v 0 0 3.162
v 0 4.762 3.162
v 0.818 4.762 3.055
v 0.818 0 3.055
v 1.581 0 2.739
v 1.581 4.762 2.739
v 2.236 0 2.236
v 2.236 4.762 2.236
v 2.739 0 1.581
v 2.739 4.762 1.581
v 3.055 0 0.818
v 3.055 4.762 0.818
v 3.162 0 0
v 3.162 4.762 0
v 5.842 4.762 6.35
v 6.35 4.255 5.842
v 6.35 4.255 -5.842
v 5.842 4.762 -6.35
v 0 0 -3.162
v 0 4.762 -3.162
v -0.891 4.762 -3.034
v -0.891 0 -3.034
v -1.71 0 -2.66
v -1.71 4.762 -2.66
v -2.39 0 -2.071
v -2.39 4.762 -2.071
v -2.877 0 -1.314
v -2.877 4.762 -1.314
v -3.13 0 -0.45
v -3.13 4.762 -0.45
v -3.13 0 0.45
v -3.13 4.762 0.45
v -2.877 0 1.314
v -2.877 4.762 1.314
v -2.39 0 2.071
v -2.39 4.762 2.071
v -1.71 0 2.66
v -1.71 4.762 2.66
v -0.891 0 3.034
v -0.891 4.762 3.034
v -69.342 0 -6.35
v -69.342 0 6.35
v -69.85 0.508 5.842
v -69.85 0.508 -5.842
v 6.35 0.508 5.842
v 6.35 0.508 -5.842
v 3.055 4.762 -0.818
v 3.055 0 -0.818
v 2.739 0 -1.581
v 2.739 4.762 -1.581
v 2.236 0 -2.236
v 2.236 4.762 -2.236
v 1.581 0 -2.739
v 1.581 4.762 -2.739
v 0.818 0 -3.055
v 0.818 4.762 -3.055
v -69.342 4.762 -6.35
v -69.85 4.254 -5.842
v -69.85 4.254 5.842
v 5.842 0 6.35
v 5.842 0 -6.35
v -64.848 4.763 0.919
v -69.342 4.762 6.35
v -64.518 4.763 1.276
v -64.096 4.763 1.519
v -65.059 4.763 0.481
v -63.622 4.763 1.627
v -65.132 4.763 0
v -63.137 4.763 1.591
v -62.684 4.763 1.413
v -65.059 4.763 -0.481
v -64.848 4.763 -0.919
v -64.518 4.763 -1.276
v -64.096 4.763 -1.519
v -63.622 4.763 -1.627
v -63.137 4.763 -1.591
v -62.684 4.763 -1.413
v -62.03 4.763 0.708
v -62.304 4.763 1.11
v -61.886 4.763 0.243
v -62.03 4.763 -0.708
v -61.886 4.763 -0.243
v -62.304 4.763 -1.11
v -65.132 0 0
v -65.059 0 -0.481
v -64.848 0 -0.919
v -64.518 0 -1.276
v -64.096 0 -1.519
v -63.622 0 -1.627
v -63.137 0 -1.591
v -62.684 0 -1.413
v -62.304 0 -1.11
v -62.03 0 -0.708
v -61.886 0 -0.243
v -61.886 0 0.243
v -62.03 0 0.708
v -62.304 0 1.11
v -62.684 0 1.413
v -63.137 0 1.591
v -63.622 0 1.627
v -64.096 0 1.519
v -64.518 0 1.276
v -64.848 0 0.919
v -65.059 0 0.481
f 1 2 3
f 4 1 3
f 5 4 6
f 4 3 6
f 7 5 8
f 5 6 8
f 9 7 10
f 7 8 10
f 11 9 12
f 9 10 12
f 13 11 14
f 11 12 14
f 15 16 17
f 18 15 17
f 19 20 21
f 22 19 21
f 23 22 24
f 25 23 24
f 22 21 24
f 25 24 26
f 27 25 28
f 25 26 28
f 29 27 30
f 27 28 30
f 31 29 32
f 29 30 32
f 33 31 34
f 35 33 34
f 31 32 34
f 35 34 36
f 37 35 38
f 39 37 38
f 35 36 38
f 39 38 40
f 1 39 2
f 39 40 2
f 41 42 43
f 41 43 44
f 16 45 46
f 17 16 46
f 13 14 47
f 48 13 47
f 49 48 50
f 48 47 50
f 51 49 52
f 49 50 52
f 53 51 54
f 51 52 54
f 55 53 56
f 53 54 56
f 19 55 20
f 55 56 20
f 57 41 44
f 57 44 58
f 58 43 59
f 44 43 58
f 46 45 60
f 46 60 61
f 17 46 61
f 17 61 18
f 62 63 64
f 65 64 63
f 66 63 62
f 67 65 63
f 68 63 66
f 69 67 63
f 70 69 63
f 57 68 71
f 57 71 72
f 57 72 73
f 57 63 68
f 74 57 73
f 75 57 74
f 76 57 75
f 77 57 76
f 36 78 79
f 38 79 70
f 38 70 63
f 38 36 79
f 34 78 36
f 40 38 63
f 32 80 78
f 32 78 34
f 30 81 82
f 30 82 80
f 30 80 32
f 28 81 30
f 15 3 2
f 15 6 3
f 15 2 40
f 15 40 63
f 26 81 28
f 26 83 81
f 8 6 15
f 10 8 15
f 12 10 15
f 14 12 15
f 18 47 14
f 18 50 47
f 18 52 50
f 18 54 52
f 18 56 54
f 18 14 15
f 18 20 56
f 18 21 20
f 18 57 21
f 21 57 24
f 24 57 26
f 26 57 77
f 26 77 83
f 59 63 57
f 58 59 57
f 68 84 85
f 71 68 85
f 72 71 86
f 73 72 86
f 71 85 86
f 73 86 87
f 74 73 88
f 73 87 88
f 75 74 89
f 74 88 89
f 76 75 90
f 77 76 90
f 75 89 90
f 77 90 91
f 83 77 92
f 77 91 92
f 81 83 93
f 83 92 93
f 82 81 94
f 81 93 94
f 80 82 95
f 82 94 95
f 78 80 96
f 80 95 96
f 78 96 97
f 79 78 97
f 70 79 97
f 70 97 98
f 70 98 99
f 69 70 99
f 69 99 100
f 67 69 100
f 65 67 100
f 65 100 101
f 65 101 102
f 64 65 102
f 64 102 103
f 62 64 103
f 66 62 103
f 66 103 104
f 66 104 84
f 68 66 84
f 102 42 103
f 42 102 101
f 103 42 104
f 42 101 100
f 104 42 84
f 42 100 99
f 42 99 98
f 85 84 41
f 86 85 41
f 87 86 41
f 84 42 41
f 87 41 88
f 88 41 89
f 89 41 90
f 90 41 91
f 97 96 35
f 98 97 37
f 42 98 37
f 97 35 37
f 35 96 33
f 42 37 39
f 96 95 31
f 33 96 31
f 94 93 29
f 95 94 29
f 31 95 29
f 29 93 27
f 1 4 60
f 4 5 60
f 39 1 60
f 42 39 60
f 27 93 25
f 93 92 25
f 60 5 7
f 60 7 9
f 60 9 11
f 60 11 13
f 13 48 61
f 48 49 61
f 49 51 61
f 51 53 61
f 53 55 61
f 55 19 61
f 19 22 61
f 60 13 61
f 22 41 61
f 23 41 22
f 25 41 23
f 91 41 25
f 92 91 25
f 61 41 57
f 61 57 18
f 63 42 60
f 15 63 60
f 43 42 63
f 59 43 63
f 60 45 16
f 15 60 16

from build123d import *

# Parameters (mm, degrees)
SKETCH1_W             = 76.2
SKETCH1_H             = 12.7
BOSS_EXTRUDE2_DEPTH   = 4.7625
F_4_CLEARANCE_HOLE1_D = 3.2639
CUT_EXTRUDE1_DEPTH    = 5.7625
CHAMFER1_SIZE         = 0.508


with BuildPart() as part:
    # Sketch1 → Boss-Extrude2 (new body)
    with BuildSketch(Plane(origin=(0, 0, 0), x_dir=(1, 0, 0), z_dir=(0, 1, 0))):
        with Locations((-31.75, 0)):
            Rectangle(SKETCH1_W, SKETCH1_H)
    extrude(amount=BOSS_EXTRUDE2_DEPTH)

    # #4 Clearance Hole1 (through all)
    with Locations(Plane(origin=(0, 4.7625, 0), x_dir=(1, 0, 0), z_dir=(0, 1, 0))):
        with Locations((-63.5, 0)):
            Hole(F_4_CLEARANCE_HOLE1_D / 2)

    # Sketch2 → Cut-Extrude1 (cut, through all)
    with BuildSketch(Plane(origin=(0, 4.7625, 0), x_dir=(1, 0, 0), z_dir=(0, 1, 0))):
        with BuildLine():
            ThreePointArc((3.1623, 0), (2.236083774, 2.236083774), (0, 3.1623))
            Line((0, 3.1623), (0, -3.1623))
            ThreePointArc((0, -3.1623), (2.236083774, -2.236083774), (3.1623, 0))
        make_face()
        with BuildLine():
            Line((0, -3.1623), (0, 3.1623))
            ThreePointArc((0, 3.1623), (-3.1623, 0), (0, -3.1623))
        make_face()
    extrude(amount=-CUT_EXTRUDE1_DEPTH, mode=Mode.SUBTRACT)

    # Chamfer1
    chamfer1_edges = [part.edges().sort_by_distance(p)[0] for p in [
        (-69.85, 2.38125, 6.35),
        (-69.85, 2.38125, -6.35),
        (6.35, 2.38125, -6.35),
        (6.35, 2.38125, 6.35),
        (6.35, 4.7625, 0),
        (-69.85, 4.7625, 0),
        (-69.85, 0, 0),
        (6.35, 0, 0),
    ]]
    chamfer(chamfer1_edges, length=CHAMFER1_SIZE)


solid = part.part
